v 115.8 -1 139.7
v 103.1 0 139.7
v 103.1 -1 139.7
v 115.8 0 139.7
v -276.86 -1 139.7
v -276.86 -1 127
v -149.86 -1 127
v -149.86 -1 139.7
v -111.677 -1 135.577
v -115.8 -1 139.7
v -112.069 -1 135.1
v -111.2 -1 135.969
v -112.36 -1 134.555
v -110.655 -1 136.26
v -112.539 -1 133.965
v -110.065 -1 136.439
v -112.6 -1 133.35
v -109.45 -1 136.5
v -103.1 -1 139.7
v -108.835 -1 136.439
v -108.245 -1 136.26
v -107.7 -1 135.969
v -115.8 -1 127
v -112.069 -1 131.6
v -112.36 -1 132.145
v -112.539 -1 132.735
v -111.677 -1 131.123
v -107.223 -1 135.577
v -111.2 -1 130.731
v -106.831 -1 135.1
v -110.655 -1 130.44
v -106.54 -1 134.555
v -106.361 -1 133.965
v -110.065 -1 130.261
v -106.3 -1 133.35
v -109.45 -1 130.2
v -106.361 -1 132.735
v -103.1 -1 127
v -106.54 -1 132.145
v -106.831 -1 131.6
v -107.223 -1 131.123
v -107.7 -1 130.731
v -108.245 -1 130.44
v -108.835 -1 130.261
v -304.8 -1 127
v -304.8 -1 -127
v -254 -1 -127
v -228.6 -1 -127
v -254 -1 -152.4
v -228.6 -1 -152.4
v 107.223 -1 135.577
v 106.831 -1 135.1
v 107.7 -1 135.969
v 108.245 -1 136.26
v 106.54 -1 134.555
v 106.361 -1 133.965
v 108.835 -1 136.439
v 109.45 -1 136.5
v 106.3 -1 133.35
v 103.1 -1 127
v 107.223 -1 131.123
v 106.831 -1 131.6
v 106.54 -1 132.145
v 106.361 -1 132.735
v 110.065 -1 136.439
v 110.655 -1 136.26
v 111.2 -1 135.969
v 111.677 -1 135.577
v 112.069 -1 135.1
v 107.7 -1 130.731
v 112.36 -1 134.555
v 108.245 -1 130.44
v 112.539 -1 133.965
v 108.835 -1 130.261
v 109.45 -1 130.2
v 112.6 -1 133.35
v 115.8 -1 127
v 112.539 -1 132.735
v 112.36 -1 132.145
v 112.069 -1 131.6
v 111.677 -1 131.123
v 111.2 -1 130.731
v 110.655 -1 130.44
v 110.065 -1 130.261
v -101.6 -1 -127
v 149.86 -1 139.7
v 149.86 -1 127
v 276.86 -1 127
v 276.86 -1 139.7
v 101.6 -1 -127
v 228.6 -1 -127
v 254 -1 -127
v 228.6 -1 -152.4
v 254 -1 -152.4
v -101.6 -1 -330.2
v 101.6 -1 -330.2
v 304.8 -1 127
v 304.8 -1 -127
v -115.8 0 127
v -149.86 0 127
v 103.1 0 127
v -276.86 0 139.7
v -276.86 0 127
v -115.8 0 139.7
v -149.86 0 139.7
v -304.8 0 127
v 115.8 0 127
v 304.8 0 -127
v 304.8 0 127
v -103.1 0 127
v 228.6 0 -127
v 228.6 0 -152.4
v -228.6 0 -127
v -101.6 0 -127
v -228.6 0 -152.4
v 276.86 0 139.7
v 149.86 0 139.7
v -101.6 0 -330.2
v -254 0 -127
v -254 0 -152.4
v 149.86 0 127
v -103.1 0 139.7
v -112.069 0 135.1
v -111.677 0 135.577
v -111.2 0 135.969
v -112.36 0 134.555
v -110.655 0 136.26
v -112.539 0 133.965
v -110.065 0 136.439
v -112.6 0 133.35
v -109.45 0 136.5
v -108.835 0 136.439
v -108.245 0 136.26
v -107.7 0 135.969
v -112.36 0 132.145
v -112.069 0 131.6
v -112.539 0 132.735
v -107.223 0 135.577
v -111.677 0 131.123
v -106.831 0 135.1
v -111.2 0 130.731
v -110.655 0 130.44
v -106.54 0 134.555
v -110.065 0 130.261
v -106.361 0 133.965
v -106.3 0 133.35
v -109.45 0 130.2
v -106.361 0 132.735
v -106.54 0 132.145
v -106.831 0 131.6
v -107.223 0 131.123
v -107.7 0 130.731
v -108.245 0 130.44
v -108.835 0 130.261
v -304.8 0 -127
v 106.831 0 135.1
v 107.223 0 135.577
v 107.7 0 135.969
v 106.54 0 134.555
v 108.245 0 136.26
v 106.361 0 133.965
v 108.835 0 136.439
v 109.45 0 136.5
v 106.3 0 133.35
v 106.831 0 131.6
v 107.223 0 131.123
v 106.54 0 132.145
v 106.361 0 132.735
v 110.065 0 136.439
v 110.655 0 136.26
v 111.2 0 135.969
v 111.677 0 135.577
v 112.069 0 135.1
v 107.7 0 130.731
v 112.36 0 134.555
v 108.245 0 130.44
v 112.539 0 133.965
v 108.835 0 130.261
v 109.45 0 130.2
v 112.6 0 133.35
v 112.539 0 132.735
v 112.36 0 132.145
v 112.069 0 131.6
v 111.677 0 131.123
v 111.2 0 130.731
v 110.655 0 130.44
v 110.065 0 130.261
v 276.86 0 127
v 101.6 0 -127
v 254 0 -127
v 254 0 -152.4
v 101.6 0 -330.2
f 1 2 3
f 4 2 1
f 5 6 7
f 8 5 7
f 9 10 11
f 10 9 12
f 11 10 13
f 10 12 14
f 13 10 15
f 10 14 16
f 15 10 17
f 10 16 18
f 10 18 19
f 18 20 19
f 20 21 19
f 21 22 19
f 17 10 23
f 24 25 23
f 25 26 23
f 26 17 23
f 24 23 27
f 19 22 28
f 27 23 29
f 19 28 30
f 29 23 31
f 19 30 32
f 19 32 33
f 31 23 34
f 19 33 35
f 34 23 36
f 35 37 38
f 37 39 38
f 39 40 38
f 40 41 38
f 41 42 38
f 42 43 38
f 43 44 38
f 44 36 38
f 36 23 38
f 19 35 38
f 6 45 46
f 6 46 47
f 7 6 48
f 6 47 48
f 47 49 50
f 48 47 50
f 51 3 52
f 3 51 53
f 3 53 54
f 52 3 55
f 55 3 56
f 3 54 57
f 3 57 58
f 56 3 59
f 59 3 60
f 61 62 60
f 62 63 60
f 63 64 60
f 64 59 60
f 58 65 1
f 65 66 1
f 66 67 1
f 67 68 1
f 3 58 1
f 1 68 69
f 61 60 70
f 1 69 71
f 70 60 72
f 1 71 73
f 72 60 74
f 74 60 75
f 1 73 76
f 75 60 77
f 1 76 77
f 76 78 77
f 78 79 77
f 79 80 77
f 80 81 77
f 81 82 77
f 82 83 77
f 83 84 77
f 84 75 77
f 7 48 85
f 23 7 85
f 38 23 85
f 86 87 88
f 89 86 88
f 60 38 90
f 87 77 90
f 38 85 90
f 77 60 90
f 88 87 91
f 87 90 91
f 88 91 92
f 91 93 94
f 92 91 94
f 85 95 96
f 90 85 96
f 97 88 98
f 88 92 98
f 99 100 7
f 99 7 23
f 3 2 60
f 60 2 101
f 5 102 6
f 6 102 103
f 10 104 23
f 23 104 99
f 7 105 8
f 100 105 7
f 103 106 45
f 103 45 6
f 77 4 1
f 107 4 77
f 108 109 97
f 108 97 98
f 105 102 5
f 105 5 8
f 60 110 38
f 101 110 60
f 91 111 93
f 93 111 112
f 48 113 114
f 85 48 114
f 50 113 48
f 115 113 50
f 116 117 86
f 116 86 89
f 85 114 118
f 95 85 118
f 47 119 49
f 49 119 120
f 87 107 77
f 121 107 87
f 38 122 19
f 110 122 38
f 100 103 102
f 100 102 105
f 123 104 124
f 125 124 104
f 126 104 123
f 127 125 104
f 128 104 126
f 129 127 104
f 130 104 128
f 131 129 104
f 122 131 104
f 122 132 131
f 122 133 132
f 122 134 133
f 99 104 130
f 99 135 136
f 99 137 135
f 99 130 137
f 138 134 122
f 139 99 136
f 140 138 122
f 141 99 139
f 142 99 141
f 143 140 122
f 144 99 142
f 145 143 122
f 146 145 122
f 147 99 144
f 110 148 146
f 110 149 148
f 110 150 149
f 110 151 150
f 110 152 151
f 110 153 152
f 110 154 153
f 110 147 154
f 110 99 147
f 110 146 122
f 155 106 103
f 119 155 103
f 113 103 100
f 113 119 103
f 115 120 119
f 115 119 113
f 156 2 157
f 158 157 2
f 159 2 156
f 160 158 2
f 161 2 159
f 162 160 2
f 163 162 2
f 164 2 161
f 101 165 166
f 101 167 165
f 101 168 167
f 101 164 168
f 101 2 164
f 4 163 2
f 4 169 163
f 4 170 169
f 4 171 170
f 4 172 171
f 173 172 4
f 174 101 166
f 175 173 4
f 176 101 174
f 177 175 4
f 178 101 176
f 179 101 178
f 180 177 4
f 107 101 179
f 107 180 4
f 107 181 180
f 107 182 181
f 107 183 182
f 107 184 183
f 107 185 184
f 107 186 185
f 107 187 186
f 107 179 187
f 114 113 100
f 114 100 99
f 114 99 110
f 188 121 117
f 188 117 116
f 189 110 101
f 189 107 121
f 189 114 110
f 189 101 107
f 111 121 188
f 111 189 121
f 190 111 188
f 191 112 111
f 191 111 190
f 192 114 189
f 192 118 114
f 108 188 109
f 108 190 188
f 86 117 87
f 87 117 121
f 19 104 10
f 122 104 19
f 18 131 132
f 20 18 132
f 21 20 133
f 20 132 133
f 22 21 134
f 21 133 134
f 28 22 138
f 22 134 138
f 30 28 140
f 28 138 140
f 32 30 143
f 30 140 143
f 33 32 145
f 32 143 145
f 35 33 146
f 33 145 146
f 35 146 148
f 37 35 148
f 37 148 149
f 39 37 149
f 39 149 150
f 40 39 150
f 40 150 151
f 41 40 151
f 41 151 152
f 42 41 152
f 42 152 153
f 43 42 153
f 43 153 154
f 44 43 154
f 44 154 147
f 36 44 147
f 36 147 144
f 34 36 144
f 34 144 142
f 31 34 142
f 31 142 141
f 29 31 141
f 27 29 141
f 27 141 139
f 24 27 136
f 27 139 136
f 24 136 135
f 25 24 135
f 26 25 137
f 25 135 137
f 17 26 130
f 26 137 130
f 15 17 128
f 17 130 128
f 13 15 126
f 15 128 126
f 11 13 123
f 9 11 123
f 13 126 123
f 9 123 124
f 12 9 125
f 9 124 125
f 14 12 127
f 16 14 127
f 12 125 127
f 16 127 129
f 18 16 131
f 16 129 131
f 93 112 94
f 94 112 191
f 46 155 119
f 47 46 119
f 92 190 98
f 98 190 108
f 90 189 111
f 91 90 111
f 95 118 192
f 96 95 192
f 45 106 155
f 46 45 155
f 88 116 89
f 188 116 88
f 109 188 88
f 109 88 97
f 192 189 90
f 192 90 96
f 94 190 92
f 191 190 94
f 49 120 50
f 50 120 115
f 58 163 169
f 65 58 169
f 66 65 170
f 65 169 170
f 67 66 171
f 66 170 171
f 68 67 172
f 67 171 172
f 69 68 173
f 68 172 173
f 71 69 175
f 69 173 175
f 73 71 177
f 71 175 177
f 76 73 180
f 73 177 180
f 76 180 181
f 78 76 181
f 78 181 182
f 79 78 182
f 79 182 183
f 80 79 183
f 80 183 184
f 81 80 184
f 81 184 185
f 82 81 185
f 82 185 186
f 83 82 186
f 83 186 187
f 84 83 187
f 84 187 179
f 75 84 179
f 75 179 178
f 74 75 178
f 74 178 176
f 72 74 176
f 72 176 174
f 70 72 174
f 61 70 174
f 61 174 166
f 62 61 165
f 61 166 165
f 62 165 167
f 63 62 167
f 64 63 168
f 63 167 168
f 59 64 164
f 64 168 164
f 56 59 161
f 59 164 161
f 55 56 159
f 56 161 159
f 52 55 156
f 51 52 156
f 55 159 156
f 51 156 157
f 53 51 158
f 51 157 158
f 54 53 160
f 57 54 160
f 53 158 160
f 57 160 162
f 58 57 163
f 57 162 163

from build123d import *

# Parameters (mm, degrees)
SKETCH1_W          = 609.6
SKETCH1_H          = 254
BASE_FLANGE1_DEPTH = 1
SKETCH6_W          = 25.4
SKETCH6_H          = 25.4
TAB2_DEPTH         = 1
SKETCH11_W         = 25.4
SKETCH11_H         = 25.4
TAB3_DEPTH         = 1
SKETCH14_W         = 203.2
SKETCH14_H         = 203.2
TAB4_DEPTH         = 1
SKETCH17_W         = 127
SKETCH17_H         = 12.7
TAB5_DEPTH         = 1
SKETCH20_W         = 127
SKETCH20_H         = 12.7
TAB7_DEPTH         = 1
SKETCH25_W         = 12.7
SKETCH25_H         = 12.7
TAB8_DEPTH         = 1
SKETCH28_W         = 12.7
SKETCH28_H         = 12.7
TAB10_DEPTH        = 1
SKETCH36_R         = 3.15
CUT_EXTRUDE2_DEPTH = 450.372985392
SKETCH38_R         = 3.15
CUT_EXTRUDE3_DEPTH = 450.372985392


# Sheet-metal steps are written as plain solids
with BuildPart() as part:
    # Sketch1 → Base-Flange1 (new body)
    with BuildSketch(Plane(origin=(0, 0, 0), x_dir=(1, 0, 0), z_dir=(0, 1, 0))):
        Rectangle(SKETCH1_W, SKETCH1_H)
    extrude(amount=-BASE_FLANGE1_DEPTH)

    # Sketch6 → Tab2 (add)
    with BuildSketch(Plane(origin=(0, 0, 0), x_dir=(1, 0, 0), z_dir=(0, 1, 0))):
        with Locations((-241.3, 139.7)):
            Rectangle(SKETCH6_W, SKETCH6_H)
    extrude(amount=-TAB2_DEPTH)

    # Sketch11 → Tab3 (add)
    with BuildSketch(Plane(origin=(0, 0, 0), x_dir=(1, 0, 0), z_dir=(0, 1, 0))):
        with Locations((241.3, 139.7)):
            Rectangle(SKETCH11_W, SKETCH11_H)
    extrude(amount=-TAB3_DEPTH)

    # Sketch14 → Tab4 (add)
    with BuildSketch(Plane(origin=(0, 0, 0), x_dir=(1, 0, 0), z_dir=(0, 1, 0))):
        with Locations((0, 228.6)):
            Rectangle(SKETCH14_W, SKETCH14_H)
    extrude(amount=-TAB4_DEPTH)

    # Sketch17 → Tab5 (add)
    with BuildSketch(Plane(origin=(0, 0, 0), x_dir=(1, 0, 0), z_dir=(0, 1, 0))):
        with Locations((-213.36, -133.35)):
            Rectangle(SKETCH17_W, SKETCH17_H)
    extrude(amount=-TAB5_DEPTH)

    # Sketch20 → Tab7 (add)
    with BuildSketch(Plane(origin=(0, 0, 0), x_dir=(1, 0, 0), z_dir=(0, 1, 0))):
        with Locations((213.36, -133.35)):
            Rectangle(SKETCH20_W, SKETCH20_H)
    extrude(amount=-TAB7_DEPTH)

    # Sketch25 → Tab8 (add)
    with BuildSketch(Plane(origin=(0, 0, 0), x_dir=(1, 0, 0), z_dir=(0, 1, 0))):
        with Locations((-109.45, -133.35)):
            Rectangle(SKETCH25_W, SKETCH25_H)
    extrude(amount=-TAB8_DEPTH)

    # Sketch28 → Tab10 (add)
    with BuildSketch(Plane(origin=(0, 0, 0), x_dir=(1, 0, 0), z_dir=(0, 1, 0))):
        with Locations((109.45, -133.35)):
            Rectangle(SKETCH28_W, SKETCH28_H)
    extrude(amount=-TAB10_DEPTH)

    # Sketch36 → Cut-Extrude2 (cut, through all)
    with BuildSketch(Plane(origin=(0, 0, 0), x_dir=(1, 0, 0), z_dir=(0, 1, 0))):
        with Locations(Location((-109.45, -133.35, 0), (0, 0, 270))):
            Circle(SKETCH36_R)
    extrude(amount=-CUT_EXTRUDE2_DEPTH, mode=Mode.SUBTRACT)

    # Sketch38 → Cut-Extrude3 (cut, through all)
    with BuildSketch(Plane(origin=(0, 0, 0), x_dir=(1, 0, 0), z_dir=(0, 1, 0))):
        with Locations(Location((109.45, -133.35, 0), (0, 0, 270))):
            Circle(SKETCH38_R)
    extrude(amount=-CUT_EXTRUDE3_DEPTH, mode=Mode.SUBTRACT)


solid = part.part
